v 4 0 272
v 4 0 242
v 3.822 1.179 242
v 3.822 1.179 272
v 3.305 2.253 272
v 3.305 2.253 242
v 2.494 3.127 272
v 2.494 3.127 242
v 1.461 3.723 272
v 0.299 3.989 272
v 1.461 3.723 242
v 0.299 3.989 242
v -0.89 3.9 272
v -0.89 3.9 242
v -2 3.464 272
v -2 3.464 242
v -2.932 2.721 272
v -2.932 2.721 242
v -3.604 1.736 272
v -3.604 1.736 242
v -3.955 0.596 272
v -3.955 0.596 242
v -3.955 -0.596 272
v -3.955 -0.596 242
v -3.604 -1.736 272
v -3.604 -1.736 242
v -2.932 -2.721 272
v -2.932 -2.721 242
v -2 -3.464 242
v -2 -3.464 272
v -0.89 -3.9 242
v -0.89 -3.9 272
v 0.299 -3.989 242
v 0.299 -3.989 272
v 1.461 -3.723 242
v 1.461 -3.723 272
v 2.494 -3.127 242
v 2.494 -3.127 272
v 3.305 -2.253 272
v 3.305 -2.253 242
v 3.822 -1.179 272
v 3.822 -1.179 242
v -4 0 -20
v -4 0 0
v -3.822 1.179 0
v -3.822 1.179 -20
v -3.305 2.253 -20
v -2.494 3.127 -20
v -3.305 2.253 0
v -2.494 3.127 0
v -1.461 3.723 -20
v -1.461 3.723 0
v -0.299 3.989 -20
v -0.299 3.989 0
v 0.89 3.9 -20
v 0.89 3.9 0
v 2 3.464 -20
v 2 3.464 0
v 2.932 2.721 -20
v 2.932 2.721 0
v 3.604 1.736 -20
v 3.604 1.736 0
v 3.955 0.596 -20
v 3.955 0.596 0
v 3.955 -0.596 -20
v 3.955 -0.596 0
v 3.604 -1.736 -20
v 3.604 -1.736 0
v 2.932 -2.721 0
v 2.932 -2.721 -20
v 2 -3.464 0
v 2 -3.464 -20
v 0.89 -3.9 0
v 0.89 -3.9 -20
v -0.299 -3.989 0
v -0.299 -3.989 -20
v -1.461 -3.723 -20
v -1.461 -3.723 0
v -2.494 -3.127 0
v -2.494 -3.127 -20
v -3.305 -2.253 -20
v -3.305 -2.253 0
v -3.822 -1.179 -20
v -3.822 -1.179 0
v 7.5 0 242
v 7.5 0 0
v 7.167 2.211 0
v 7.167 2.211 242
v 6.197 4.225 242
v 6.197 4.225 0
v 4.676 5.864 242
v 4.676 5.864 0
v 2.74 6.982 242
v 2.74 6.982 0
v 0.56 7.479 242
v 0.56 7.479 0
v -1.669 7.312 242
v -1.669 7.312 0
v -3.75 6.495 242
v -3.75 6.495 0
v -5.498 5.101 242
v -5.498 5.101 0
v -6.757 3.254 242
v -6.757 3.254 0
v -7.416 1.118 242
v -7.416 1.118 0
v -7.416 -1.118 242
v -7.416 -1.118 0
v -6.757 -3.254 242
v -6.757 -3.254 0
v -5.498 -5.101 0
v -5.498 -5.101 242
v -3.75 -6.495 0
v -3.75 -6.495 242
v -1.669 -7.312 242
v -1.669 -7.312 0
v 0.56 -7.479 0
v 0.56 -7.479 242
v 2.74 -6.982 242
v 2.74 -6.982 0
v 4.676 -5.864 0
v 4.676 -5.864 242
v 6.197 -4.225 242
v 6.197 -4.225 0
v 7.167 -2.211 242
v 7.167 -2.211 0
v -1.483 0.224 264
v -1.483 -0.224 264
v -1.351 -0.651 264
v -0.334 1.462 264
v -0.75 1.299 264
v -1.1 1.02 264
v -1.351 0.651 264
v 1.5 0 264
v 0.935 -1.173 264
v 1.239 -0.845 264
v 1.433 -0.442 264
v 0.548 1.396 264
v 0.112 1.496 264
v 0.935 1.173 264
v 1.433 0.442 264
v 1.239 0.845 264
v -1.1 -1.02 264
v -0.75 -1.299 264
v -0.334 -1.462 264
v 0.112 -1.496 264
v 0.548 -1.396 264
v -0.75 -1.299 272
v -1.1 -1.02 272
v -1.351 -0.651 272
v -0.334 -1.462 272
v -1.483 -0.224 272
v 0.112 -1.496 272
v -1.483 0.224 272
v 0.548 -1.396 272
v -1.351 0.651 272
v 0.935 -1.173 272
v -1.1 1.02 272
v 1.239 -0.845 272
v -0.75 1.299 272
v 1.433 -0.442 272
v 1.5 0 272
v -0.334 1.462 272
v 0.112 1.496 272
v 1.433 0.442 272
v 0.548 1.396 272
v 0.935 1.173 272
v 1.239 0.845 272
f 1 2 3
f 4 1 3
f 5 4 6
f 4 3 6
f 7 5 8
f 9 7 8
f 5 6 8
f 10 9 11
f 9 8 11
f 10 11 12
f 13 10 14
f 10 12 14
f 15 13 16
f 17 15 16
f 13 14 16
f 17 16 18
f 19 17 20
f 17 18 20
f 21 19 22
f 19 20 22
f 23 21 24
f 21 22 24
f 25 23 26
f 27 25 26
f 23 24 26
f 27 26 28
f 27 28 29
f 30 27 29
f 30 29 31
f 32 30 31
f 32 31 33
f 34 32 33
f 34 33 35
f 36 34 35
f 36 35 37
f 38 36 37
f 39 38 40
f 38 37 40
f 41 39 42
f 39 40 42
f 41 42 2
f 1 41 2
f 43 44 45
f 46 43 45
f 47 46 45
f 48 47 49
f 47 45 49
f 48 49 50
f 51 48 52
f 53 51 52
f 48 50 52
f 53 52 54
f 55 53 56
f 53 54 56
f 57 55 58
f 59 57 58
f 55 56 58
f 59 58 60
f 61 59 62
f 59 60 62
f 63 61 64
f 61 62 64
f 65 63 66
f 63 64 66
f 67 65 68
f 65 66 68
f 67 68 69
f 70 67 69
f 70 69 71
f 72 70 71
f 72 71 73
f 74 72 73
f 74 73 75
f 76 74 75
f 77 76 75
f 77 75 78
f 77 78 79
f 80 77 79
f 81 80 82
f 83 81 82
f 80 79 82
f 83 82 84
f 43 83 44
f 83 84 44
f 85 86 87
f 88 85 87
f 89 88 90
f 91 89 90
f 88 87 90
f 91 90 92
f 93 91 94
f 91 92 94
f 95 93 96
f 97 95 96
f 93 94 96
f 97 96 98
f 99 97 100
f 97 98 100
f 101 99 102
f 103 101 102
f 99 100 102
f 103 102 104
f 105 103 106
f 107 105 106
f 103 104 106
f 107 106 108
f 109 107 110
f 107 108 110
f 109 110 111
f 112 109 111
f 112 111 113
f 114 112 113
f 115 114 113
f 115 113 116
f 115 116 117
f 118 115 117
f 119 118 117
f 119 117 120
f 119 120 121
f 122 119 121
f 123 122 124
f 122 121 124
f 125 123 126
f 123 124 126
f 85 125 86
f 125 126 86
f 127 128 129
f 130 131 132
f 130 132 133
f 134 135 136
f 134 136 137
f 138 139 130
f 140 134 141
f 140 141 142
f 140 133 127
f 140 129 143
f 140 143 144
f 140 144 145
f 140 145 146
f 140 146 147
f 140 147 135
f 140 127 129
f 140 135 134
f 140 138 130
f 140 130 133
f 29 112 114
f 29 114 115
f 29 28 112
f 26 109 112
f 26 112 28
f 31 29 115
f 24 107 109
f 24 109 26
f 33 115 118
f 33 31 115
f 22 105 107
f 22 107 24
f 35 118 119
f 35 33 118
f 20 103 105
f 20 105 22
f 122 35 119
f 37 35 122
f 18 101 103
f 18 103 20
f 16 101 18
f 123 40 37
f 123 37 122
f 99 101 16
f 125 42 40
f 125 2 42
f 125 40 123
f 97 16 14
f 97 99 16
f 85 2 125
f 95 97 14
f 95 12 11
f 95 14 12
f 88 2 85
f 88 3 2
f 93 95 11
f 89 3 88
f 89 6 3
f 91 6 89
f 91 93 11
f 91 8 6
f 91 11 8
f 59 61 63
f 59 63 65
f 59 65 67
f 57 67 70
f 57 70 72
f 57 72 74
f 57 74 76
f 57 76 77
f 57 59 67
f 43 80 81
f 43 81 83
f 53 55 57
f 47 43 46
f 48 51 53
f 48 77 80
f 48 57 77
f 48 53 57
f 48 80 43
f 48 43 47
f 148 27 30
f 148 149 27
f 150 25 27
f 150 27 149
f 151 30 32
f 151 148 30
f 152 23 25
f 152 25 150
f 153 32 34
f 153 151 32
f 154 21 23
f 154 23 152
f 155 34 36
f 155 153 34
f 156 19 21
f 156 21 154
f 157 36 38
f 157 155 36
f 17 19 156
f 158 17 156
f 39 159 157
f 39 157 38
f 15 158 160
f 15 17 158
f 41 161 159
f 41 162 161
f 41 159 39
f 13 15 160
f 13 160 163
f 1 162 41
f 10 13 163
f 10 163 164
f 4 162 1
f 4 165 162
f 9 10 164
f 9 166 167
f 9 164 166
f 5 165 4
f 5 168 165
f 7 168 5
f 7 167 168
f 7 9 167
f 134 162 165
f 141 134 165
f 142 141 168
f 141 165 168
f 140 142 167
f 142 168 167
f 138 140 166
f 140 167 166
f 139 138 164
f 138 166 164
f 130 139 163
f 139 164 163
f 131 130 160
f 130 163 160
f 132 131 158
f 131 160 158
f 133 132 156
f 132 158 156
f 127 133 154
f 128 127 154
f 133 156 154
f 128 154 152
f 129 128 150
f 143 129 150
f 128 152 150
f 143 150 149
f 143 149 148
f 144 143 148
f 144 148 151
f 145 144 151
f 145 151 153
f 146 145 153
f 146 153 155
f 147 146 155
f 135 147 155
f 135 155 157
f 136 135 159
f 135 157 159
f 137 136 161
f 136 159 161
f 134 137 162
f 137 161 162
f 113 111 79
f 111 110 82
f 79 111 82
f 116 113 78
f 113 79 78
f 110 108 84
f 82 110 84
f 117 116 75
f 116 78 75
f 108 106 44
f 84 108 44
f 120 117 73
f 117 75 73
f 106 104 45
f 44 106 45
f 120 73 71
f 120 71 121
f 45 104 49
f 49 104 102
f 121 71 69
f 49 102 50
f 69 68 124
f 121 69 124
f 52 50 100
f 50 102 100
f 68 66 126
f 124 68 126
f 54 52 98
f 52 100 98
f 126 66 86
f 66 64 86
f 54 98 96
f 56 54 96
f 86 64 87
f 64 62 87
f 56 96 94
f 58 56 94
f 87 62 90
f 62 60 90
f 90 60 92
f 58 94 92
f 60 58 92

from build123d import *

# Parameters (mm, degrees)
SKETCH1_R           = 7.5
BOSS_EXTRUDE1_DEPTH = 242
SKETCH2_R           = 4
BOSS_EXTRUDE2_DEPTH = 30
SKETCH3_R           = 4
BOSS_EXTRUDE3_DEPTH = 20
SKETCH4_R           = 1.5
CUT_EXTRUDE1_DEPTH  = 8


with BuildPart() as part:
    # Sketch1 → Boss-Extrude1 (new body)
    with BuildSketch(Plane.XY):
        Circle(SKETCH1_R)
    extrude(amount=BOSS_EXTRUDE1_DEPTH)

    # Sketch2 → Boss-Extrude2 (add)
    with BuildSketch(Plane.XY.offset(242)):
        Circle(SKETCH2_R)
    extrude(amount=BOSS_EXTRUDE2_DEPTH)

    # Sketch3 → Boss-Extrude3 (add)
    with BuildSketch(Plane(origin=(0, 0, 0), x_dir=(-1, 0, 0), z_dir=(0, 0, -1))):
        Circle(SKETCH3_R)
    extrude(amount=BOSS_EXTRUDE3_DEPTH)

    # Sketch4 → Cut-Extrude1 (cut)
    with BuildSketch(Plane.XY.offset(272)):
        Circle(SKETCH4_R)
    extrude(amount=-CUT_EXTRUDE1_DEPTH, mode=Mode.SUBTRACT)


solid = part.part
